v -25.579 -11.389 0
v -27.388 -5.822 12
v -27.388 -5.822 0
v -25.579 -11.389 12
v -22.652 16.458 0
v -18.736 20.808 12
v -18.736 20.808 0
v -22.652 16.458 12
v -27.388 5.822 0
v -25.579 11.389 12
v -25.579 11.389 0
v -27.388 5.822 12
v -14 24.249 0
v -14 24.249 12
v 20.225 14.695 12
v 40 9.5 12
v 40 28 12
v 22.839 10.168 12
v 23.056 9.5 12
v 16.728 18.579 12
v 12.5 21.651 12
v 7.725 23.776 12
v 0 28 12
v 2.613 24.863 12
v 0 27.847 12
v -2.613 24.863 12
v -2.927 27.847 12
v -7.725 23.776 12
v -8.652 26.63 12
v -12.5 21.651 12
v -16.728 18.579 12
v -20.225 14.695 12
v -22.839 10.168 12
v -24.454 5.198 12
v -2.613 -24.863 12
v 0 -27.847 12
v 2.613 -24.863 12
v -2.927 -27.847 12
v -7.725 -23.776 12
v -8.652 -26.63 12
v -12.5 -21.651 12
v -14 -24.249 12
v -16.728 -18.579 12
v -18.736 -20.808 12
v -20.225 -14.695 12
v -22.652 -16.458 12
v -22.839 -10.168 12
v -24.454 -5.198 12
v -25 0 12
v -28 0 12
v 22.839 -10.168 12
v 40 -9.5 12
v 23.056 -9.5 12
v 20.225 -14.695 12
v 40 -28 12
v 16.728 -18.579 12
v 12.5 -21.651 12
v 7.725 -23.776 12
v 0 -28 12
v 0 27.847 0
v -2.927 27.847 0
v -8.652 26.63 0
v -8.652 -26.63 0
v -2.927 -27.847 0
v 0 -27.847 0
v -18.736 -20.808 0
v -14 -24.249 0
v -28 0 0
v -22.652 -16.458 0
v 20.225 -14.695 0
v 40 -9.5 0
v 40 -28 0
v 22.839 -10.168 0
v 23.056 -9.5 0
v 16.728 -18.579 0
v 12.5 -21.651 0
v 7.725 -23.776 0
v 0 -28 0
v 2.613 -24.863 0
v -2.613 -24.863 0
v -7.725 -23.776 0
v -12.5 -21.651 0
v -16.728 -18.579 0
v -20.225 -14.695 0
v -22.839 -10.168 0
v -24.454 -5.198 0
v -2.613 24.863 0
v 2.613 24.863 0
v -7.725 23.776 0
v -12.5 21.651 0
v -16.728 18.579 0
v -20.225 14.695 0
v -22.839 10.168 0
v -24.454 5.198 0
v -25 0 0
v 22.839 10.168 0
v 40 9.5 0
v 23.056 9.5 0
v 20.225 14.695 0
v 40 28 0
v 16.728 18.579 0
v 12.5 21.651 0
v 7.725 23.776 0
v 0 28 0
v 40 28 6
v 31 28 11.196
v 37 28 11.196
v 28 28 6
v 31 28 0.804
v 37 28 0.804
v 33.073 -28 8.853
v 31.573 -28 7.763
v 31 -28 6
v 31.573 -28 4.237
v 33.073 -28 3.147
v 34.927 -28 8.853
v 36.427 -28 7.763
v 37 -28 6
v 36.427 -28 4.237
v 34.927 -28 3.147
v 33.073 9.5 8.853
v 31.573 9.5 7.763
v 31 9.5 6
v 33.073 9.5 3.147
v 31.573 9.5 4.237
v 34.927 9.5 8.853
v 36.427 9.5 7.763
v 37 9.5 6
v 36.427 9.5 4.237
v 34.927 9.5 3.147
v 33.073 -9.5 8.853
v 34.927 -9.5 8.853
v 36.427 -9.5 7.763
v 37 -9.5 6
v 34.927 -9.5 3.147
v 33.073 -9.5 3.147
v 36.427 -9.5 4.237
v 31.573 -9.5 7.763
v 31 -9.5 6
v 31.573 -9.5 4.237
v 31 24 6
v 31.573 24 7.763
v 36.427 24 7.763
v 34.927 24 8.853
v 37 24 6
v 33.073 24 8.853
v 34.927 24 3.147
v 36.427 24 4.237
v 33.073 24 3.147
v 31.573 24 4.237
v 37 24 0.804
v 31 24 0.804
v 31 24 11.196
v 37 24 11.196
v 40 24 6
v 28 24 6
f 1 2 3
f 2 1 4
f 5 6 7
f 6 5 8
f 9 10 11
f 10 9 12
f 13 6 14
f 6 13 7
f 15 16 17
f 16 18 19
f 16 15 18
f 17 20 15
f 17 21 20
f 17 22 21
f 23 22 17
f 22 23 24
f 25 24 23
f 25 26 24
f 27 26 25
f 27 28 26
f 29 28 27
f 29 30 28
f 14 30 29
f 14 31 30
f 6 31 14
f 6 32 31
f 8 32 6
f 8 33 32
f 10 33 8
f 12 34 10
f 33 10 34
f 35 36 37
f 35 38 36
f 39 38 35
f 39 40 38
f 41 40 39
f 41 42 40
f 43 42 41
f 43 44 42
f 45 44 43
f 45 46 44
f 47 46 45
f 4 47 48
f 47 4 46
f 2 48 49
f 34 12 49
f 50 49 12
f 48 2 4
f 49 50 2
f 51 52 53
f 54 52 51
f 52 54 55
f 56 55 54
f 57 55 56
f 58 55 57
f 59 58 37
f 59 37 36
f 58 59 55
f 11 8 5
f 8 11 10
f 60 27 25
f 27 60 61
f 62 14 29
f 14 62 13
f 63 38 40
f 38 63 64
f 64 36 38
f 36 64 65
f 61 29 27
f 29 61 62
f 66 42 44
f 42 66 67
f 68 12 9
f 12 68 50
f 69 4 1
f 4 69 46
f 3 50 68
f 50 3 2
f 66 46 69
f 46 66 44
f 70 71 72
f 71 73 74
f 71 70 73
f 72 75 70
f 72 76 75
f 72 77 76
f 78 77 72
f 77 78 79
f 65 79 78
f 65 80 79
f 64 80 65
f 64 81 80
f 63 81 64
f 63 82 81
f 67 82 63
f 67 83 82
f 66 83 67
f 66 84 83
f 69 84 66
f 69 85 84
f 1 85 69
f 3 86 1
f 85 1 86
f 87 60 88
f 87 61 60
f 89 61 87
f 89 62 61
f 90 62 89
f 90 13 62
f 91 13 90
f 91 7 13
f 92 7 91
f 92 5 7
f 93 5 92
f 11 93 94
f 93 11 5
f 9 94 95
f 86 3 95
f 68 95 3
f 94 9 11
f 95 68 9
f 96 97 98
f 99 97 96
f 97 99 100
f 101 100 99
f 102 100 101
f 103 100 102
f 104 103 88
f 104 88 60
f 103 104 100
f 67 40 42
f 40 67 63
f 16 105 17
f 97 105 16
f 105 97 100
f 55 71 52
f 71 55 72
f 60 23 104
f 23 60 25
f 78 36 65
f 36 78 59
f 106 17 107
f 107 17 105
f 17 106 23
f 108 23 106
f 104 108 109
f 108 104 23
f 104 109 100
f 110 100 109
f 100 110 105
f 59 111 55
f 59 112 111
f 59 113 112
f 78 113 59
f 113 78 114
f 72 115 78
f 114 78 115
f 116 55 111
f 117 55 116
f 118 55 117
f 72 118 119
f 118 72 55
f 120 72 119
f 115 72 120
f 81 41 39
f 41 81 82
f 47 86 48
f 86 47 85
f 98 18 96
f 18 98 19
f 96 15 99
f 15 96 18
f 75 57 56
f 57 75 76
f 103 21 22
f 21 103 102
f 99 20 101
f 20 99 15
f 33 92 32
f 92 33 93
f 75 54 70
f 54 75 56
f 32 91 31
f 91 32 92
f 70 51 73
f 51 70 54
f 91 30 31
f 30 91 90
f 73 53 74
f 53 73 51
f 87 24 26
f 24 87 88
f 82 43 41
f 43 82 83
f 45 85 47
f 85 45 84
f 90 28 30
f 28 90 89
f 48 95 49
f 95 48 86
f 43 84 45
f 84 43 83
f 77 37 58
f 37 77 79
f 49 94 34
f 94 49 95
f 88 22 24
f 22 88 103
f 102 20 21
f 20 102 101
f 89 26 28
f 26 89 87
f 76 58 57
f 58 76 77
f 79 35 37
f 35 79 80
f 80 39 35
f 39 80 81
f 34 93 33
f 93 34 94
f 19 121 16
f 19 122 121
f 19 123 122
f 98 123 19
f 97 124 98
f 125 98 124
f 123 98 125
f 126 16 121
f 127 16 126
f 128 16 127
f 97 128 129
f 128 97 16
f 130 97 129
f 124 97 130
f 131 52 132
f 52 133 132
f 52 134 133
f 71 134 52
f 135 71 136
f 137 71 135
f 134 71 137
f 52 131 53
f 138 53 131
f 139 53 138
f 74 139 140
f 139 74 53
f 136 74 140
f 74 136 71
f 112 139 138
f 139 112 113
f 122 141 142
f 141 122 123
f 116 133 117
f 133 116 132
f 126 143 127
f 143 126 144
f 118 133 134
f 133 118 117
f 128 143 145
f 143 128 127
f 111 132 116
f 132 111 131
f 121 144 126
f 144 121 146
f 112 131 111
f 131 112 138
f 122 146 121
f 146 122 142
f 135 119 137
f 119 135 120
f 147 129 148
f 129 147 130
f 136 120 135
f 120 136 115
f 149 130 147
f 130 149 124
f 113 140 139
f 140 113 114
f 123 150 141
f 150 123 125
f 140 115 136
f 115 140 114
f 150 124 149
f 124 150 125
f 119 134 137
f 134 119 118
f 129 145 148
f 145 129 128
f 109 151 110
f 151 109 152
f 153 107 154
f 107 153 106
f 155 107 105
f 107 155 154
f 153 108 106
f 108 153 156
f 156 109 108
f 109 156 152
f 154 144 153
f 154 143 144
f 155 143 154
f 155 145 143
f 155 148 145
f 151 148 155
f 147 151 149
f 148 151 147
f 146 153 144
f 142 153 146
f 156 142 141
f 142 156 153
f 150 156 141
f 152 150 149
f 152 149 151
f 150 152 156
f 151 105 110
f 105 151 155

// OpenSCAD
//Radius of tube to clamp to
R=25;
//Width of ring
w=3;
//Bolt screw radius
screwR=3;
//Bolt/nut wrench size
nutR=6;
//Bolt/nut trap size
nutH=4;
//Space of clamp
space=19;



module clamp(R,w,screwR,nutR,nutH,space){
    h=screwR*4;
    difference(){
        union(){
            cylinder(r=R+w,h = h);
            translate([0,-(R+w),0]) cube([(R+w+h),(R+w)*2,h]);
        }
        cylinder(r=R,h=h);
        translate([0,-space/2,0]) cube([(R+w+h),space,h]);
        
        
        translate([(R+w+screwR*2),(R+w),screwR*2]) rotate([90,0,0]) cylinder(r=screwR,h=(R+w)*2);
        translate([(R+w+screwR*2),(R+w),screwR*2]) rotate([90,0,0]) cylinder(r=nutR,h=nutH, $fn=6);
        
    }

}


clamp(R,w,screwR,nutR,nutH,space);
